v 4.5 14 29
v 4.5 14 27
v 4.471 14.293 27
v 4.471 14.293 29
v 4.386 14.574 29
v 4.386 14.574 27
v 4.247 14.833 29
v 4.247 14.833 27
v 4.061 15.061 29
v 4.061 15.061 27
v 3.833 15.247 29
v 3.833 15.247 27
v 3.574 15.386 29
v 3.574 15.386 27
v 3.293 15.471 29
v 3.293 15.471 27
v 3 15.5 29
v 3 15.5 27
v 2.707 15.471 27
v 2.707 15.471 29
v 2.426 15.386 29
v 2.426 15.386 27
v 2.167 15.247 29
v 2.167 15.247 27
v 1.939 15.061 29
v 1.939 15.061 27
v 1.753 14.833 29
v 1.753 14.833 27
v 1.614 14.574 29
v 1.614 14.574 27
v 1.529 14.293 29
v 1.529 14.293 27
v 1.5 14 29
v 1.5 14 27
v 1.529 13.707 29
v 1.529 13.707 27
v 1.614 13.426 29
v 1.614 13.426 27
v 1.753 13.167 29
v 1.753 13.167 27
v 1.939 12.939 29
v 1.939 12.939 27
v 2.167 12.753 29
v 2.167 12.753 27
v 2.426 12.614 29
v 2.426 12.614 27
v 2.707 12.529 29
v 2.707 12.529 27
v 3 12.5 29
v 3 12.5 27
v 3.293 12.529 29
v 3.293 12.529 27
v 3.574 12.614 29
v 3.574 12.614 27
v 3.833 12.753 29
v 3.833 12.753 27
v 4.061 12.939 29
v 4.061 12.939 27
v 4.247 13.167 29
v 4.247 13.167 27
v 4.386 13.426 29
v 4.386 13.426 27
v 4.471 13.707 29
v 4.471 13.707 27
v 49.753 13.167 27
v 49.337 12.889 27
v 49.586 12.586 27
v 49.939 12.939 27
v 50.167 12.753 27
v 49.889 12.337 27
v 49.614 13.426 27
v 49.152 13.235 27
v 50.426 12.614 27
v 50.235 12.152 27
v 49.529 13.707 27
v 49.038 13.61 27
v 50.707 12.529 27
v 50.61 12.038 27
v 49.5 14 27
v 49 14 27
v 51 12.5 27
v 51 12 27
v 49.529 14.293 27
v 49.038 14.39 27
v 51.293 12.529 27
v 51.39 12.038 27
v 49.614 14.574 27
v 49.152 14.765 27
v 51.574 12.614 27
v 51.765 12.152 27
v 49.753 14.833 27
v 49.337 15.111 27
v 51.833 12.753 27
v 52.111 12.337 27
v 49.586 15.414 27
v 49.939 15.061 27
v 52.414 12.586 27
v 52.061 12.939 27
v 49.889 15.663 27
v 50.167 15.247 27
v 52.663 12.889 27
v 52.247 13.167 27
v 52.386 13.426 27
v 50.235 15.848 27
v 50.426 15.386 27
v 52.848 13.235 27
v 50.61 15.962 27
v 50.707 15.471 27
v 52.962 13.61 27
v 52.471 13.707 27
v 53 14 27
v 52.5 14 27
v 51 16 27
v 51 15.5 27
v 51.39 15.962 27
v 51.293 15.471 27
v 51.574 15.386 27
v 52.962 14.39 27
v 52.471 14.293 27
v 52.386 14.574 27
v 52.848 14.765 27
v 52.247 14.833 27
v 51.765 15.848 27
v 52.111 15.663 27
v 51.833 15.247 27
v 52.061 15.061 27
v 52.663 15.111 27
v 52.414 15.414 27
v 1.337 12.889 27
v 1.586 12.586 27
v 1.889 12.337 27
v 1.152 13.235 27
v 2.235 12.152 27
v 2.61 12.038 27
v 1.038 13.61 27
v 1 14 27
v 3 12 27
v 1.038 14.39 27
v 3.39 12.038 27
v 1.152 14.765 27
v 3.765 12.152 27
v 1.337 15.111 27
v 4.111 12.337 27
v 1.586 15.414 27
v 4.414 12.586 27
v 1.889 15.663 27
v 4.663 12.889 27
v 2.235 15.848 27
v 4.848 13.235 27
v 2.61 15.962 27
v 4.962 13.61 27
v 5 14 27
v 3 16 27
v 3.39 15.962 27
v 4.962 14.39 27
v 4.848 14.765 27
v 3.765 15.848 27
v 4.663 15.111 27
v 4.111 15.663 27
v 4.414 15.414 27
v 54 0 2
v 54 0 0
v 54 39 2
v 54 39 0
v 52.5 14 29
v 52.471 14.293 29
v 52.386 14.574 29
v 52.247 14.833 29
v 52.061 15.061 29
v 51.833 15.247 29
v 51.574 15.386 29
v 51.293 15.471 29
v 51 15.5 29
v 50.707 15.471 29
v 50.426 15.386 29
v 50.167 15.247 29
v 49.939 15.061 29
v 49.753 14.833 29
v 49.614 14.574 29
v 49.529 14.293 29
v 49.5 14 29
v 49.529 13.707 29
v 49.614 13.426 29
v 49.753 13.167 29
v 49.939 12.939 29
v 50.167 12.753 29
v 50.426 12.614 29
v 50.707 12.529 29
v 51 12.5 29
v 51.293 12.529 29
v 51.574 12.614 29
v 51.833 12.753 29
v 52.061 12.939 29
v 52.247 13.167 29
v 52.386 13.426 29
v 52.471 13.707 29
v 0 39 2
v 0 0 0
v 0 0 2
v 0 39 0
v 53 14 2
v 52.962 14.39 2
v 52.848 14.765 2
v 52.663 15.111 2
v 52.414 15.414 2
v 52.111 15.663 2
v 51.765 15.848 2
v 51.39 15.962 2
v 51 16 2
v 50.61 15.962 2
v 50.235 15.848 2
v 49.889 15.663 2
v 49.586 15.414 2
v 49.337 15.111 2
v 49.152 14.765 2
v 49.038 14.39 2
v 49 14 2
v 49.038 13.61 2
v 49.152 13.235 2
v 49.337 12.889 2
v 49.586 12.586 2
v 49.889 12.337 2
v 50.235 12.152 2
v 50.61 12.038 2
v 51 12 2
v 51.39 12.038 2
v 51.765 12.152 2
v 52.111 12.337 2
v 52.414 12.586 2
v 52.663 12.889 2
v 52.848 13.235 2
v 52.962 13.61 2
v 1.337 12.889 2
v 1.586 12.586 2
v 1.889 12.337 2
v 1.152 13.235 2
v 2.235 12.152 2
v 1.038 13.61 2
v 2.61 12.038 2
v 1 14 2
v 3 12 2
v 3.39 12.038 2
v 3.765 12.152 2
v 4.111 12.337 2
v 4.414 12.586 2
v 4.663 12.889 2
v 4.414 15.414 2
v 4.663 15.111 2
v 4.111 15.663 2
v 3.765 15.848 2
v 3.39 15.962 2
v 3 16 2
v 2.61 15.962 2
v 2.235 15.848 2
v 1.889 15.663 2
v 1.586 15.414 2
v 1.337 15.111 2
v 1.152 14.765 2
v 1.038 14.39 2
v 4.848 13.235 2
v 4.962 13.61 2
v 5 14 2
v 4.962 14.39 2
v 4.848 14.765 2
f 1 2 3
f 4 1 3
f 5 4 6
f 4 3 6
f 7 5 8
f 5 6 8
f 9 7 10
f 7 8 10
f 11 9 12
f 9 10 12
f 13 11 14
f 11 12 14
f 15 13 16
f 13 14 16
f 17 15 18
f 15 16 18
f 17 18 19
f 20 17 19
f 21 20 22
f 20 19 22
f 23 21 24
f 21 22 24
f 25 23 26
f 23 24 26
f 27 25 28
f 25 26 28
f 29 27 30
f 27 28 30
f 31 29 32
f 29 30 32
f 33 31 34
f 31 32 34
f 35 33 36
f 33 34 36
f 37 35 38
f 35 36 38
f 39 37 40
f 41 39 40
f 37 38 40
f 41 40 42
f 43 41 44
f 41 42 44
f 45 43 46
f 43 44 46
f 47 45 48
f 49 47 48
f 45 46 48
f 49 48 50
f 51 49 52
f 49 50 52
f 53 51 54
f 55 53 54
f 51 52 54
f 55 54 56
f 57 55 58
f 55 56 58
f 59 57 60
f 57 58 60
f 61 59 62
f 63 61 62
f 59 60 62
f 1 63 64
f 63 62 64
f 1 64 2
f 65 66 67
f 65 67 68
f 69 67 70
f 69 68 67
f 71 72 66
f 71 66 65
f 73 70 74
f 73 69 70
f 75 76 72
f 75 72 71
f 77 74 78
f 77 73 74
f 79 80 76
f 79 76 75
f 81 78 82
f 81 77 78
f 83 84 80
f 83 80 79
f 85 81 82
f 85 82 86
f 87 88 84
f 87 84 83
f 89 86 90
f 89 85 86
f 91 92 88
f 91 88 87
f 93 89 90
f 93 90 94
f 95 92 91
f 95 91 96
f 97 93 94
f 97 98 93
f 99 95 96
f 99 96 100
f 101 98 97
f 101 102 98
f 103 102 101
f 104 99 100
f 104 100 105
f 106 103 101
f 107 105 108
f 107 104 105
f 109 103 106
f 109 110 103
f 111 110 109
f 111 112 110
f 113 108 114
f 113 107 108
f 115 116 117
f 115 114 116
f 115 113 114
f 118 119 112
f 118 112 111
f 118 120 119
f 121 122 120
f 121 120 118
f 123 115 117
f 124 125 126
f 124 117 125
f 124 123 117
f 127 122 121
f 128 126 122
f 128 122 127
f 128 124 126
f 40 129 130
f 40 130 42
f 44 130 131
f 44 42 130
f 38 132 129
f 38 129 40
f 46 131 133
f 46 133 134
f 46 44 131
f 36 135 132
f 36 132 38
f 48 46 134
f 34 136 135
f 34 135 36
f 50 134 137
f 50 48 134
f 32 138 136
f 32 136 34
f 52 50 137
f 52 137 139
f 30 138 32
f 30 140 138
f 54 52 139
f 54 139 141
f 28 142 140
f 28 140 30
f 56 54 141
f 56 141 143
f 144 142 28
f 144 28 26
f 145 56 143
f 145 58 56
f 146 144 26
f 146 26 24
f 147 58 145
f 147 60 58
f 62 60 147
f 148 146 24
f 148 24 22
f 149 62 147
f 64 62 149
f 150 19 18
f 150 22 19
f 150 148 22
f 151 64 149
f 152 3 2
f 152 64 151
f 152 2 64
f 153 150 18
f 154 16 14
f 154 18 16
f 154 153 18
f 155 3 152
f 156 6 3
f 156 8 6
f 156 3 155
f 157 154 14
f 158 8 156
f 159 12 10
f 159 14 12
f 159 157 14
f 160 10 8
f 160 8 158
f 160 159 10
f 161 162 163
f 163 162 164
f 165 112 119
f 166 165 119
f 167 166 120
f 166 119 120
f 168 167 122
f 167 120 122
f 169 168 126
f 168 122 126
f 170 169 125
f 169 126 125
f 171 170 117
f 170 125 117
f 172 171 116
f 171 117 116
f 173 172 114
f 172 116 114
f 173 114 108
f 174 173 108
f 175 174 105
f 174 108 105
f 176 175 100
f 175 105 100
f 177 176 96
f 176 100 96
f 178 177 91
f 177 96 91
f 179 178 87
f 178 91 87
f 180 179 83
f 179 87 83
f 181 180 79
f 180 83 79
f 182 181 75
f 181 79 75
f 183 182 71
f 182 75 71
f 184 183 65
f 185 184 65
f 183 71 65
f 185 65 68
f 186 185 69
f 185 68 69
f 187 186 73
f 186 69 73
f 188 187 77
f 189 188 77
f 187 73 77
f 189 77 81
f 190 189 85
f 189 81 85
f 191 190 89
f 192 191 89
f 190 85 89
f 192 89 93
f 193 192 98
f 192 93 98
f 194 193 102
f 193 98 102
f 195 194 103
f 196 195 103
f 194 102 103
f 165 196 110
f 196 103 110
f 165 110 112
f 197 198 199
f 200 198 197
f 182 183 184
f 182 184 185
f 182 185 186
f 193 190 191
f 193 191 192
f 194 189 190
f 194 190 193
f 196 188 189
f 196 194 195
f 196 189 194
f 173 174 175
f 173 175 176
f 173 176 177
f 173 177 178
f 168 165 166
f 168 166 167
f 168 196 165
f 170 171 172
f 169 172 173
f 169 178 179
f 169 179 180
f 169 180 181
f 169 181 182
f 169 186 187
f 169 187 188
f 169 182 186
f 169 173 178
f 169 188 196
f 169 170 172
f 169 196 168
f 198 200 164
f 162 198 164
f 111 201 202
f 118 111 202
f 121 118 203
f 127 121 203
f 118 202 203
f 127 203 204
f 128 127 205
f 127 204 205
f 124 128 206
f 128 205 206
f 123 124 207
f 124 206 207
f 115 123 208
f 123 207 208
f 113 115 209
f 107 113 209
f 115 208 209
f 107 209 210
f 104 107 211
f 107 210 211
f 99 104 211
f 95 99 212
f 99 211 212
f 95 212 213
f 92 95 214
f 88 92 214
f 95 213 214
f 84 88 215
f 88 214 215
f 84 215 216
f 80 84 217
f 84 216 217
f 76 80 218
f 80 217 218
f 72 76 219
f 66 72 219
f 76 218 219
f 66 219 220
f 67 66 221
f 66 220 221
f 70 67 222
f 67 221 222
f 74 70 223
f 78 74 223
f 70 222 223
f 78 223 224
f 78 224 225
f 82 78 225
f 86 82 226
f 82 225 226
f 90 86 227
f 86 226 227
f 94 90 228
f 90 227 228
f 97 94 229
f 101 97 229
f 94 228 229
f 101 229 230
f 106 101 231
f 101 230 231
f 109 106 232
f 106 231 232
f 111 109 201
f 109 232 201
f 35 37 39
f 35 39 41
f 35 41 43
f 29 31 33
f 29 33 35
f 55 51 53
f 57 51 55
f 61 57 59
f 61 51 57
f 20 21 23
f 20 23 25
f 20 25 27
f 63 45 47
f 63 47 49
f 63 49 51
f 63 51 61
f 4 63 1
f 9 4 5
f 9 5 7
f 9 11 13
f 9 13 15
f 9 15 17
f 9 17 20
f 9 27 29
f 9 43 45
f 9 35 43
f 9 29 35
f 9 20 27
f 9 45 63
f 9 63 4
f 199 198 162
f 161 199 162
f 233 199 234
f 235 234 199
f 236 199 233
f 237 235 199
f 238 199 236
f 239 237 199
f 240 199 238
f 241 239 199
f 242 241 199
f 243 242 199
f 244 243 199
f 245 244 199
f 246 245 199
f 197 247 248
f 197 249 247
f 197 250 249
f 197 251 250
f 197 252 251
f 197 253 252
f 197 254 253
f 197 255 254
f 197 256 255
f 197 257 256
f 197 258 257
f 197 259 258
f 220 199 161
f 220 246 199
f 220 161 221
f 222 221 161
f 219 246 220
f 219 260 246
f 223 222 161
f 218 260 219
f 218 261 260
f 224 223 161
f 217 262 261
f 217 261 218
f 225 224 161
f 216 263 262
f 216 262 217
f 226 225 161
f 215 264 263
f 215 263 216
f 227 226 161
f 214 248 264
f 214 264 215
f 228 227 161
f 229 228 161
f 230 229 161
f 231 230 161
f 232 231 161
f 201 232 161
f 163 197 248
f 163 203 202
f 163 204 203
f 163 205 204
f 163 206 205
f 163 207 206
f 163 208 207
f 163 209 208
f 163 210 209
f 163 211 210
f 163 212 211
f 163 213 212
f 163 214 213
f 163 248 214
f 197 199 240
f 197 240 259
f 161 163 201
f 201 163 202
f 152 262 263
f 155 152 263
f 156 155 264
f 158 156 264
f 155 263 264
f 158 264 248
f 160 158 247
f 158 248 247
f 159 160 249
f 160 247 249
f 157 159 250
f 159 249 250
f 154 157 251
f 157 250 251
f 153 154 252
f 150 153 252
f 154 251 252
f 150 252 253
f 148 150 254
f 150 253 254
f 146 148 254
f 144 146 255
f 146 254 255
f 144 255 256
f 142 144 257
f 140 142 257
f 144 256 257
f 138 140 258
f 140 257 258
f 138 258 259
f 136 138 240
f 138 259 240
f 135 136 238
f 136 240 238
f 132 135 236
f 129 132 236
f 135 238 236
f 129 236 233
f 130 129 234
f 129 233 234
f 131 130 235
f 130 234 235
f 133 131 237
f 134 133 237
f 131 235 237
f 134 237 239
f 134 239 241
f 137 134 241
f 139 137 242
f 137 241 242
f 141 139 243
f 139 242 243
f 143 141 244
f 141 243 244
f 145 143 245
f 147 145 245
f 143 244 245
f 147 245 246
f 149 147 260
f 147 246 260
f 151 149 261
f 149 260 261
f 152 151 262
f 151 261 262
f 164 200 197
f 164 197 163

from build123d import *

# Parameters (mm, degrees)
SKETCH_W     = 54
SKETCH_H     = 39
PAD_DEPTH    = 2
SKETCH001_R  = 2
PAD001_DEPTH = 25
SKETCH002_R  = 1.5
PAD002_DEPTH = 2
SKETCH003_R  = 1.5
PAD003_DEPTH = 2


with BuildPart() as part:
    # Sketch → Pad (new body)
    with BuildSketch(Plane.XY):
        with Locations((27, 19.5)):
            Rectangle(SKETCH_W, SKETCH_H)
    extrude(amount=PAD_DEPTH)

    # Sketch001 (on Face6 of Pad) → Pad001 (join)
    with BuildSketch(Plane.XY.offset(2)):
        with Locations((3, 14)):
            Circle(SKETCH001_R)
        with Locations((51, 14)):
            Circle(SKETCH001_R)
    extrude(amount=PAD001_DEPTH)

    # Sketch002 (on Face9 of Pad001) → Pad002 (join)
    with BuildSketch(Plane.XY.offset(27)):
        with Locations((51, 14)):
            Circle(SKETCH002_R)
    extrude(amount=PAD002_DEPTH)

    # Sketch003 (on Face9 of Pad002) → Pad003 (join)
    with BuildSketch(Plane.XY.offset(27)):
        with Locations((3, 14)):
            Circle(SKETCH003_R)
    extrude(amount=PAD003_DEPTH)


solid = part.part
